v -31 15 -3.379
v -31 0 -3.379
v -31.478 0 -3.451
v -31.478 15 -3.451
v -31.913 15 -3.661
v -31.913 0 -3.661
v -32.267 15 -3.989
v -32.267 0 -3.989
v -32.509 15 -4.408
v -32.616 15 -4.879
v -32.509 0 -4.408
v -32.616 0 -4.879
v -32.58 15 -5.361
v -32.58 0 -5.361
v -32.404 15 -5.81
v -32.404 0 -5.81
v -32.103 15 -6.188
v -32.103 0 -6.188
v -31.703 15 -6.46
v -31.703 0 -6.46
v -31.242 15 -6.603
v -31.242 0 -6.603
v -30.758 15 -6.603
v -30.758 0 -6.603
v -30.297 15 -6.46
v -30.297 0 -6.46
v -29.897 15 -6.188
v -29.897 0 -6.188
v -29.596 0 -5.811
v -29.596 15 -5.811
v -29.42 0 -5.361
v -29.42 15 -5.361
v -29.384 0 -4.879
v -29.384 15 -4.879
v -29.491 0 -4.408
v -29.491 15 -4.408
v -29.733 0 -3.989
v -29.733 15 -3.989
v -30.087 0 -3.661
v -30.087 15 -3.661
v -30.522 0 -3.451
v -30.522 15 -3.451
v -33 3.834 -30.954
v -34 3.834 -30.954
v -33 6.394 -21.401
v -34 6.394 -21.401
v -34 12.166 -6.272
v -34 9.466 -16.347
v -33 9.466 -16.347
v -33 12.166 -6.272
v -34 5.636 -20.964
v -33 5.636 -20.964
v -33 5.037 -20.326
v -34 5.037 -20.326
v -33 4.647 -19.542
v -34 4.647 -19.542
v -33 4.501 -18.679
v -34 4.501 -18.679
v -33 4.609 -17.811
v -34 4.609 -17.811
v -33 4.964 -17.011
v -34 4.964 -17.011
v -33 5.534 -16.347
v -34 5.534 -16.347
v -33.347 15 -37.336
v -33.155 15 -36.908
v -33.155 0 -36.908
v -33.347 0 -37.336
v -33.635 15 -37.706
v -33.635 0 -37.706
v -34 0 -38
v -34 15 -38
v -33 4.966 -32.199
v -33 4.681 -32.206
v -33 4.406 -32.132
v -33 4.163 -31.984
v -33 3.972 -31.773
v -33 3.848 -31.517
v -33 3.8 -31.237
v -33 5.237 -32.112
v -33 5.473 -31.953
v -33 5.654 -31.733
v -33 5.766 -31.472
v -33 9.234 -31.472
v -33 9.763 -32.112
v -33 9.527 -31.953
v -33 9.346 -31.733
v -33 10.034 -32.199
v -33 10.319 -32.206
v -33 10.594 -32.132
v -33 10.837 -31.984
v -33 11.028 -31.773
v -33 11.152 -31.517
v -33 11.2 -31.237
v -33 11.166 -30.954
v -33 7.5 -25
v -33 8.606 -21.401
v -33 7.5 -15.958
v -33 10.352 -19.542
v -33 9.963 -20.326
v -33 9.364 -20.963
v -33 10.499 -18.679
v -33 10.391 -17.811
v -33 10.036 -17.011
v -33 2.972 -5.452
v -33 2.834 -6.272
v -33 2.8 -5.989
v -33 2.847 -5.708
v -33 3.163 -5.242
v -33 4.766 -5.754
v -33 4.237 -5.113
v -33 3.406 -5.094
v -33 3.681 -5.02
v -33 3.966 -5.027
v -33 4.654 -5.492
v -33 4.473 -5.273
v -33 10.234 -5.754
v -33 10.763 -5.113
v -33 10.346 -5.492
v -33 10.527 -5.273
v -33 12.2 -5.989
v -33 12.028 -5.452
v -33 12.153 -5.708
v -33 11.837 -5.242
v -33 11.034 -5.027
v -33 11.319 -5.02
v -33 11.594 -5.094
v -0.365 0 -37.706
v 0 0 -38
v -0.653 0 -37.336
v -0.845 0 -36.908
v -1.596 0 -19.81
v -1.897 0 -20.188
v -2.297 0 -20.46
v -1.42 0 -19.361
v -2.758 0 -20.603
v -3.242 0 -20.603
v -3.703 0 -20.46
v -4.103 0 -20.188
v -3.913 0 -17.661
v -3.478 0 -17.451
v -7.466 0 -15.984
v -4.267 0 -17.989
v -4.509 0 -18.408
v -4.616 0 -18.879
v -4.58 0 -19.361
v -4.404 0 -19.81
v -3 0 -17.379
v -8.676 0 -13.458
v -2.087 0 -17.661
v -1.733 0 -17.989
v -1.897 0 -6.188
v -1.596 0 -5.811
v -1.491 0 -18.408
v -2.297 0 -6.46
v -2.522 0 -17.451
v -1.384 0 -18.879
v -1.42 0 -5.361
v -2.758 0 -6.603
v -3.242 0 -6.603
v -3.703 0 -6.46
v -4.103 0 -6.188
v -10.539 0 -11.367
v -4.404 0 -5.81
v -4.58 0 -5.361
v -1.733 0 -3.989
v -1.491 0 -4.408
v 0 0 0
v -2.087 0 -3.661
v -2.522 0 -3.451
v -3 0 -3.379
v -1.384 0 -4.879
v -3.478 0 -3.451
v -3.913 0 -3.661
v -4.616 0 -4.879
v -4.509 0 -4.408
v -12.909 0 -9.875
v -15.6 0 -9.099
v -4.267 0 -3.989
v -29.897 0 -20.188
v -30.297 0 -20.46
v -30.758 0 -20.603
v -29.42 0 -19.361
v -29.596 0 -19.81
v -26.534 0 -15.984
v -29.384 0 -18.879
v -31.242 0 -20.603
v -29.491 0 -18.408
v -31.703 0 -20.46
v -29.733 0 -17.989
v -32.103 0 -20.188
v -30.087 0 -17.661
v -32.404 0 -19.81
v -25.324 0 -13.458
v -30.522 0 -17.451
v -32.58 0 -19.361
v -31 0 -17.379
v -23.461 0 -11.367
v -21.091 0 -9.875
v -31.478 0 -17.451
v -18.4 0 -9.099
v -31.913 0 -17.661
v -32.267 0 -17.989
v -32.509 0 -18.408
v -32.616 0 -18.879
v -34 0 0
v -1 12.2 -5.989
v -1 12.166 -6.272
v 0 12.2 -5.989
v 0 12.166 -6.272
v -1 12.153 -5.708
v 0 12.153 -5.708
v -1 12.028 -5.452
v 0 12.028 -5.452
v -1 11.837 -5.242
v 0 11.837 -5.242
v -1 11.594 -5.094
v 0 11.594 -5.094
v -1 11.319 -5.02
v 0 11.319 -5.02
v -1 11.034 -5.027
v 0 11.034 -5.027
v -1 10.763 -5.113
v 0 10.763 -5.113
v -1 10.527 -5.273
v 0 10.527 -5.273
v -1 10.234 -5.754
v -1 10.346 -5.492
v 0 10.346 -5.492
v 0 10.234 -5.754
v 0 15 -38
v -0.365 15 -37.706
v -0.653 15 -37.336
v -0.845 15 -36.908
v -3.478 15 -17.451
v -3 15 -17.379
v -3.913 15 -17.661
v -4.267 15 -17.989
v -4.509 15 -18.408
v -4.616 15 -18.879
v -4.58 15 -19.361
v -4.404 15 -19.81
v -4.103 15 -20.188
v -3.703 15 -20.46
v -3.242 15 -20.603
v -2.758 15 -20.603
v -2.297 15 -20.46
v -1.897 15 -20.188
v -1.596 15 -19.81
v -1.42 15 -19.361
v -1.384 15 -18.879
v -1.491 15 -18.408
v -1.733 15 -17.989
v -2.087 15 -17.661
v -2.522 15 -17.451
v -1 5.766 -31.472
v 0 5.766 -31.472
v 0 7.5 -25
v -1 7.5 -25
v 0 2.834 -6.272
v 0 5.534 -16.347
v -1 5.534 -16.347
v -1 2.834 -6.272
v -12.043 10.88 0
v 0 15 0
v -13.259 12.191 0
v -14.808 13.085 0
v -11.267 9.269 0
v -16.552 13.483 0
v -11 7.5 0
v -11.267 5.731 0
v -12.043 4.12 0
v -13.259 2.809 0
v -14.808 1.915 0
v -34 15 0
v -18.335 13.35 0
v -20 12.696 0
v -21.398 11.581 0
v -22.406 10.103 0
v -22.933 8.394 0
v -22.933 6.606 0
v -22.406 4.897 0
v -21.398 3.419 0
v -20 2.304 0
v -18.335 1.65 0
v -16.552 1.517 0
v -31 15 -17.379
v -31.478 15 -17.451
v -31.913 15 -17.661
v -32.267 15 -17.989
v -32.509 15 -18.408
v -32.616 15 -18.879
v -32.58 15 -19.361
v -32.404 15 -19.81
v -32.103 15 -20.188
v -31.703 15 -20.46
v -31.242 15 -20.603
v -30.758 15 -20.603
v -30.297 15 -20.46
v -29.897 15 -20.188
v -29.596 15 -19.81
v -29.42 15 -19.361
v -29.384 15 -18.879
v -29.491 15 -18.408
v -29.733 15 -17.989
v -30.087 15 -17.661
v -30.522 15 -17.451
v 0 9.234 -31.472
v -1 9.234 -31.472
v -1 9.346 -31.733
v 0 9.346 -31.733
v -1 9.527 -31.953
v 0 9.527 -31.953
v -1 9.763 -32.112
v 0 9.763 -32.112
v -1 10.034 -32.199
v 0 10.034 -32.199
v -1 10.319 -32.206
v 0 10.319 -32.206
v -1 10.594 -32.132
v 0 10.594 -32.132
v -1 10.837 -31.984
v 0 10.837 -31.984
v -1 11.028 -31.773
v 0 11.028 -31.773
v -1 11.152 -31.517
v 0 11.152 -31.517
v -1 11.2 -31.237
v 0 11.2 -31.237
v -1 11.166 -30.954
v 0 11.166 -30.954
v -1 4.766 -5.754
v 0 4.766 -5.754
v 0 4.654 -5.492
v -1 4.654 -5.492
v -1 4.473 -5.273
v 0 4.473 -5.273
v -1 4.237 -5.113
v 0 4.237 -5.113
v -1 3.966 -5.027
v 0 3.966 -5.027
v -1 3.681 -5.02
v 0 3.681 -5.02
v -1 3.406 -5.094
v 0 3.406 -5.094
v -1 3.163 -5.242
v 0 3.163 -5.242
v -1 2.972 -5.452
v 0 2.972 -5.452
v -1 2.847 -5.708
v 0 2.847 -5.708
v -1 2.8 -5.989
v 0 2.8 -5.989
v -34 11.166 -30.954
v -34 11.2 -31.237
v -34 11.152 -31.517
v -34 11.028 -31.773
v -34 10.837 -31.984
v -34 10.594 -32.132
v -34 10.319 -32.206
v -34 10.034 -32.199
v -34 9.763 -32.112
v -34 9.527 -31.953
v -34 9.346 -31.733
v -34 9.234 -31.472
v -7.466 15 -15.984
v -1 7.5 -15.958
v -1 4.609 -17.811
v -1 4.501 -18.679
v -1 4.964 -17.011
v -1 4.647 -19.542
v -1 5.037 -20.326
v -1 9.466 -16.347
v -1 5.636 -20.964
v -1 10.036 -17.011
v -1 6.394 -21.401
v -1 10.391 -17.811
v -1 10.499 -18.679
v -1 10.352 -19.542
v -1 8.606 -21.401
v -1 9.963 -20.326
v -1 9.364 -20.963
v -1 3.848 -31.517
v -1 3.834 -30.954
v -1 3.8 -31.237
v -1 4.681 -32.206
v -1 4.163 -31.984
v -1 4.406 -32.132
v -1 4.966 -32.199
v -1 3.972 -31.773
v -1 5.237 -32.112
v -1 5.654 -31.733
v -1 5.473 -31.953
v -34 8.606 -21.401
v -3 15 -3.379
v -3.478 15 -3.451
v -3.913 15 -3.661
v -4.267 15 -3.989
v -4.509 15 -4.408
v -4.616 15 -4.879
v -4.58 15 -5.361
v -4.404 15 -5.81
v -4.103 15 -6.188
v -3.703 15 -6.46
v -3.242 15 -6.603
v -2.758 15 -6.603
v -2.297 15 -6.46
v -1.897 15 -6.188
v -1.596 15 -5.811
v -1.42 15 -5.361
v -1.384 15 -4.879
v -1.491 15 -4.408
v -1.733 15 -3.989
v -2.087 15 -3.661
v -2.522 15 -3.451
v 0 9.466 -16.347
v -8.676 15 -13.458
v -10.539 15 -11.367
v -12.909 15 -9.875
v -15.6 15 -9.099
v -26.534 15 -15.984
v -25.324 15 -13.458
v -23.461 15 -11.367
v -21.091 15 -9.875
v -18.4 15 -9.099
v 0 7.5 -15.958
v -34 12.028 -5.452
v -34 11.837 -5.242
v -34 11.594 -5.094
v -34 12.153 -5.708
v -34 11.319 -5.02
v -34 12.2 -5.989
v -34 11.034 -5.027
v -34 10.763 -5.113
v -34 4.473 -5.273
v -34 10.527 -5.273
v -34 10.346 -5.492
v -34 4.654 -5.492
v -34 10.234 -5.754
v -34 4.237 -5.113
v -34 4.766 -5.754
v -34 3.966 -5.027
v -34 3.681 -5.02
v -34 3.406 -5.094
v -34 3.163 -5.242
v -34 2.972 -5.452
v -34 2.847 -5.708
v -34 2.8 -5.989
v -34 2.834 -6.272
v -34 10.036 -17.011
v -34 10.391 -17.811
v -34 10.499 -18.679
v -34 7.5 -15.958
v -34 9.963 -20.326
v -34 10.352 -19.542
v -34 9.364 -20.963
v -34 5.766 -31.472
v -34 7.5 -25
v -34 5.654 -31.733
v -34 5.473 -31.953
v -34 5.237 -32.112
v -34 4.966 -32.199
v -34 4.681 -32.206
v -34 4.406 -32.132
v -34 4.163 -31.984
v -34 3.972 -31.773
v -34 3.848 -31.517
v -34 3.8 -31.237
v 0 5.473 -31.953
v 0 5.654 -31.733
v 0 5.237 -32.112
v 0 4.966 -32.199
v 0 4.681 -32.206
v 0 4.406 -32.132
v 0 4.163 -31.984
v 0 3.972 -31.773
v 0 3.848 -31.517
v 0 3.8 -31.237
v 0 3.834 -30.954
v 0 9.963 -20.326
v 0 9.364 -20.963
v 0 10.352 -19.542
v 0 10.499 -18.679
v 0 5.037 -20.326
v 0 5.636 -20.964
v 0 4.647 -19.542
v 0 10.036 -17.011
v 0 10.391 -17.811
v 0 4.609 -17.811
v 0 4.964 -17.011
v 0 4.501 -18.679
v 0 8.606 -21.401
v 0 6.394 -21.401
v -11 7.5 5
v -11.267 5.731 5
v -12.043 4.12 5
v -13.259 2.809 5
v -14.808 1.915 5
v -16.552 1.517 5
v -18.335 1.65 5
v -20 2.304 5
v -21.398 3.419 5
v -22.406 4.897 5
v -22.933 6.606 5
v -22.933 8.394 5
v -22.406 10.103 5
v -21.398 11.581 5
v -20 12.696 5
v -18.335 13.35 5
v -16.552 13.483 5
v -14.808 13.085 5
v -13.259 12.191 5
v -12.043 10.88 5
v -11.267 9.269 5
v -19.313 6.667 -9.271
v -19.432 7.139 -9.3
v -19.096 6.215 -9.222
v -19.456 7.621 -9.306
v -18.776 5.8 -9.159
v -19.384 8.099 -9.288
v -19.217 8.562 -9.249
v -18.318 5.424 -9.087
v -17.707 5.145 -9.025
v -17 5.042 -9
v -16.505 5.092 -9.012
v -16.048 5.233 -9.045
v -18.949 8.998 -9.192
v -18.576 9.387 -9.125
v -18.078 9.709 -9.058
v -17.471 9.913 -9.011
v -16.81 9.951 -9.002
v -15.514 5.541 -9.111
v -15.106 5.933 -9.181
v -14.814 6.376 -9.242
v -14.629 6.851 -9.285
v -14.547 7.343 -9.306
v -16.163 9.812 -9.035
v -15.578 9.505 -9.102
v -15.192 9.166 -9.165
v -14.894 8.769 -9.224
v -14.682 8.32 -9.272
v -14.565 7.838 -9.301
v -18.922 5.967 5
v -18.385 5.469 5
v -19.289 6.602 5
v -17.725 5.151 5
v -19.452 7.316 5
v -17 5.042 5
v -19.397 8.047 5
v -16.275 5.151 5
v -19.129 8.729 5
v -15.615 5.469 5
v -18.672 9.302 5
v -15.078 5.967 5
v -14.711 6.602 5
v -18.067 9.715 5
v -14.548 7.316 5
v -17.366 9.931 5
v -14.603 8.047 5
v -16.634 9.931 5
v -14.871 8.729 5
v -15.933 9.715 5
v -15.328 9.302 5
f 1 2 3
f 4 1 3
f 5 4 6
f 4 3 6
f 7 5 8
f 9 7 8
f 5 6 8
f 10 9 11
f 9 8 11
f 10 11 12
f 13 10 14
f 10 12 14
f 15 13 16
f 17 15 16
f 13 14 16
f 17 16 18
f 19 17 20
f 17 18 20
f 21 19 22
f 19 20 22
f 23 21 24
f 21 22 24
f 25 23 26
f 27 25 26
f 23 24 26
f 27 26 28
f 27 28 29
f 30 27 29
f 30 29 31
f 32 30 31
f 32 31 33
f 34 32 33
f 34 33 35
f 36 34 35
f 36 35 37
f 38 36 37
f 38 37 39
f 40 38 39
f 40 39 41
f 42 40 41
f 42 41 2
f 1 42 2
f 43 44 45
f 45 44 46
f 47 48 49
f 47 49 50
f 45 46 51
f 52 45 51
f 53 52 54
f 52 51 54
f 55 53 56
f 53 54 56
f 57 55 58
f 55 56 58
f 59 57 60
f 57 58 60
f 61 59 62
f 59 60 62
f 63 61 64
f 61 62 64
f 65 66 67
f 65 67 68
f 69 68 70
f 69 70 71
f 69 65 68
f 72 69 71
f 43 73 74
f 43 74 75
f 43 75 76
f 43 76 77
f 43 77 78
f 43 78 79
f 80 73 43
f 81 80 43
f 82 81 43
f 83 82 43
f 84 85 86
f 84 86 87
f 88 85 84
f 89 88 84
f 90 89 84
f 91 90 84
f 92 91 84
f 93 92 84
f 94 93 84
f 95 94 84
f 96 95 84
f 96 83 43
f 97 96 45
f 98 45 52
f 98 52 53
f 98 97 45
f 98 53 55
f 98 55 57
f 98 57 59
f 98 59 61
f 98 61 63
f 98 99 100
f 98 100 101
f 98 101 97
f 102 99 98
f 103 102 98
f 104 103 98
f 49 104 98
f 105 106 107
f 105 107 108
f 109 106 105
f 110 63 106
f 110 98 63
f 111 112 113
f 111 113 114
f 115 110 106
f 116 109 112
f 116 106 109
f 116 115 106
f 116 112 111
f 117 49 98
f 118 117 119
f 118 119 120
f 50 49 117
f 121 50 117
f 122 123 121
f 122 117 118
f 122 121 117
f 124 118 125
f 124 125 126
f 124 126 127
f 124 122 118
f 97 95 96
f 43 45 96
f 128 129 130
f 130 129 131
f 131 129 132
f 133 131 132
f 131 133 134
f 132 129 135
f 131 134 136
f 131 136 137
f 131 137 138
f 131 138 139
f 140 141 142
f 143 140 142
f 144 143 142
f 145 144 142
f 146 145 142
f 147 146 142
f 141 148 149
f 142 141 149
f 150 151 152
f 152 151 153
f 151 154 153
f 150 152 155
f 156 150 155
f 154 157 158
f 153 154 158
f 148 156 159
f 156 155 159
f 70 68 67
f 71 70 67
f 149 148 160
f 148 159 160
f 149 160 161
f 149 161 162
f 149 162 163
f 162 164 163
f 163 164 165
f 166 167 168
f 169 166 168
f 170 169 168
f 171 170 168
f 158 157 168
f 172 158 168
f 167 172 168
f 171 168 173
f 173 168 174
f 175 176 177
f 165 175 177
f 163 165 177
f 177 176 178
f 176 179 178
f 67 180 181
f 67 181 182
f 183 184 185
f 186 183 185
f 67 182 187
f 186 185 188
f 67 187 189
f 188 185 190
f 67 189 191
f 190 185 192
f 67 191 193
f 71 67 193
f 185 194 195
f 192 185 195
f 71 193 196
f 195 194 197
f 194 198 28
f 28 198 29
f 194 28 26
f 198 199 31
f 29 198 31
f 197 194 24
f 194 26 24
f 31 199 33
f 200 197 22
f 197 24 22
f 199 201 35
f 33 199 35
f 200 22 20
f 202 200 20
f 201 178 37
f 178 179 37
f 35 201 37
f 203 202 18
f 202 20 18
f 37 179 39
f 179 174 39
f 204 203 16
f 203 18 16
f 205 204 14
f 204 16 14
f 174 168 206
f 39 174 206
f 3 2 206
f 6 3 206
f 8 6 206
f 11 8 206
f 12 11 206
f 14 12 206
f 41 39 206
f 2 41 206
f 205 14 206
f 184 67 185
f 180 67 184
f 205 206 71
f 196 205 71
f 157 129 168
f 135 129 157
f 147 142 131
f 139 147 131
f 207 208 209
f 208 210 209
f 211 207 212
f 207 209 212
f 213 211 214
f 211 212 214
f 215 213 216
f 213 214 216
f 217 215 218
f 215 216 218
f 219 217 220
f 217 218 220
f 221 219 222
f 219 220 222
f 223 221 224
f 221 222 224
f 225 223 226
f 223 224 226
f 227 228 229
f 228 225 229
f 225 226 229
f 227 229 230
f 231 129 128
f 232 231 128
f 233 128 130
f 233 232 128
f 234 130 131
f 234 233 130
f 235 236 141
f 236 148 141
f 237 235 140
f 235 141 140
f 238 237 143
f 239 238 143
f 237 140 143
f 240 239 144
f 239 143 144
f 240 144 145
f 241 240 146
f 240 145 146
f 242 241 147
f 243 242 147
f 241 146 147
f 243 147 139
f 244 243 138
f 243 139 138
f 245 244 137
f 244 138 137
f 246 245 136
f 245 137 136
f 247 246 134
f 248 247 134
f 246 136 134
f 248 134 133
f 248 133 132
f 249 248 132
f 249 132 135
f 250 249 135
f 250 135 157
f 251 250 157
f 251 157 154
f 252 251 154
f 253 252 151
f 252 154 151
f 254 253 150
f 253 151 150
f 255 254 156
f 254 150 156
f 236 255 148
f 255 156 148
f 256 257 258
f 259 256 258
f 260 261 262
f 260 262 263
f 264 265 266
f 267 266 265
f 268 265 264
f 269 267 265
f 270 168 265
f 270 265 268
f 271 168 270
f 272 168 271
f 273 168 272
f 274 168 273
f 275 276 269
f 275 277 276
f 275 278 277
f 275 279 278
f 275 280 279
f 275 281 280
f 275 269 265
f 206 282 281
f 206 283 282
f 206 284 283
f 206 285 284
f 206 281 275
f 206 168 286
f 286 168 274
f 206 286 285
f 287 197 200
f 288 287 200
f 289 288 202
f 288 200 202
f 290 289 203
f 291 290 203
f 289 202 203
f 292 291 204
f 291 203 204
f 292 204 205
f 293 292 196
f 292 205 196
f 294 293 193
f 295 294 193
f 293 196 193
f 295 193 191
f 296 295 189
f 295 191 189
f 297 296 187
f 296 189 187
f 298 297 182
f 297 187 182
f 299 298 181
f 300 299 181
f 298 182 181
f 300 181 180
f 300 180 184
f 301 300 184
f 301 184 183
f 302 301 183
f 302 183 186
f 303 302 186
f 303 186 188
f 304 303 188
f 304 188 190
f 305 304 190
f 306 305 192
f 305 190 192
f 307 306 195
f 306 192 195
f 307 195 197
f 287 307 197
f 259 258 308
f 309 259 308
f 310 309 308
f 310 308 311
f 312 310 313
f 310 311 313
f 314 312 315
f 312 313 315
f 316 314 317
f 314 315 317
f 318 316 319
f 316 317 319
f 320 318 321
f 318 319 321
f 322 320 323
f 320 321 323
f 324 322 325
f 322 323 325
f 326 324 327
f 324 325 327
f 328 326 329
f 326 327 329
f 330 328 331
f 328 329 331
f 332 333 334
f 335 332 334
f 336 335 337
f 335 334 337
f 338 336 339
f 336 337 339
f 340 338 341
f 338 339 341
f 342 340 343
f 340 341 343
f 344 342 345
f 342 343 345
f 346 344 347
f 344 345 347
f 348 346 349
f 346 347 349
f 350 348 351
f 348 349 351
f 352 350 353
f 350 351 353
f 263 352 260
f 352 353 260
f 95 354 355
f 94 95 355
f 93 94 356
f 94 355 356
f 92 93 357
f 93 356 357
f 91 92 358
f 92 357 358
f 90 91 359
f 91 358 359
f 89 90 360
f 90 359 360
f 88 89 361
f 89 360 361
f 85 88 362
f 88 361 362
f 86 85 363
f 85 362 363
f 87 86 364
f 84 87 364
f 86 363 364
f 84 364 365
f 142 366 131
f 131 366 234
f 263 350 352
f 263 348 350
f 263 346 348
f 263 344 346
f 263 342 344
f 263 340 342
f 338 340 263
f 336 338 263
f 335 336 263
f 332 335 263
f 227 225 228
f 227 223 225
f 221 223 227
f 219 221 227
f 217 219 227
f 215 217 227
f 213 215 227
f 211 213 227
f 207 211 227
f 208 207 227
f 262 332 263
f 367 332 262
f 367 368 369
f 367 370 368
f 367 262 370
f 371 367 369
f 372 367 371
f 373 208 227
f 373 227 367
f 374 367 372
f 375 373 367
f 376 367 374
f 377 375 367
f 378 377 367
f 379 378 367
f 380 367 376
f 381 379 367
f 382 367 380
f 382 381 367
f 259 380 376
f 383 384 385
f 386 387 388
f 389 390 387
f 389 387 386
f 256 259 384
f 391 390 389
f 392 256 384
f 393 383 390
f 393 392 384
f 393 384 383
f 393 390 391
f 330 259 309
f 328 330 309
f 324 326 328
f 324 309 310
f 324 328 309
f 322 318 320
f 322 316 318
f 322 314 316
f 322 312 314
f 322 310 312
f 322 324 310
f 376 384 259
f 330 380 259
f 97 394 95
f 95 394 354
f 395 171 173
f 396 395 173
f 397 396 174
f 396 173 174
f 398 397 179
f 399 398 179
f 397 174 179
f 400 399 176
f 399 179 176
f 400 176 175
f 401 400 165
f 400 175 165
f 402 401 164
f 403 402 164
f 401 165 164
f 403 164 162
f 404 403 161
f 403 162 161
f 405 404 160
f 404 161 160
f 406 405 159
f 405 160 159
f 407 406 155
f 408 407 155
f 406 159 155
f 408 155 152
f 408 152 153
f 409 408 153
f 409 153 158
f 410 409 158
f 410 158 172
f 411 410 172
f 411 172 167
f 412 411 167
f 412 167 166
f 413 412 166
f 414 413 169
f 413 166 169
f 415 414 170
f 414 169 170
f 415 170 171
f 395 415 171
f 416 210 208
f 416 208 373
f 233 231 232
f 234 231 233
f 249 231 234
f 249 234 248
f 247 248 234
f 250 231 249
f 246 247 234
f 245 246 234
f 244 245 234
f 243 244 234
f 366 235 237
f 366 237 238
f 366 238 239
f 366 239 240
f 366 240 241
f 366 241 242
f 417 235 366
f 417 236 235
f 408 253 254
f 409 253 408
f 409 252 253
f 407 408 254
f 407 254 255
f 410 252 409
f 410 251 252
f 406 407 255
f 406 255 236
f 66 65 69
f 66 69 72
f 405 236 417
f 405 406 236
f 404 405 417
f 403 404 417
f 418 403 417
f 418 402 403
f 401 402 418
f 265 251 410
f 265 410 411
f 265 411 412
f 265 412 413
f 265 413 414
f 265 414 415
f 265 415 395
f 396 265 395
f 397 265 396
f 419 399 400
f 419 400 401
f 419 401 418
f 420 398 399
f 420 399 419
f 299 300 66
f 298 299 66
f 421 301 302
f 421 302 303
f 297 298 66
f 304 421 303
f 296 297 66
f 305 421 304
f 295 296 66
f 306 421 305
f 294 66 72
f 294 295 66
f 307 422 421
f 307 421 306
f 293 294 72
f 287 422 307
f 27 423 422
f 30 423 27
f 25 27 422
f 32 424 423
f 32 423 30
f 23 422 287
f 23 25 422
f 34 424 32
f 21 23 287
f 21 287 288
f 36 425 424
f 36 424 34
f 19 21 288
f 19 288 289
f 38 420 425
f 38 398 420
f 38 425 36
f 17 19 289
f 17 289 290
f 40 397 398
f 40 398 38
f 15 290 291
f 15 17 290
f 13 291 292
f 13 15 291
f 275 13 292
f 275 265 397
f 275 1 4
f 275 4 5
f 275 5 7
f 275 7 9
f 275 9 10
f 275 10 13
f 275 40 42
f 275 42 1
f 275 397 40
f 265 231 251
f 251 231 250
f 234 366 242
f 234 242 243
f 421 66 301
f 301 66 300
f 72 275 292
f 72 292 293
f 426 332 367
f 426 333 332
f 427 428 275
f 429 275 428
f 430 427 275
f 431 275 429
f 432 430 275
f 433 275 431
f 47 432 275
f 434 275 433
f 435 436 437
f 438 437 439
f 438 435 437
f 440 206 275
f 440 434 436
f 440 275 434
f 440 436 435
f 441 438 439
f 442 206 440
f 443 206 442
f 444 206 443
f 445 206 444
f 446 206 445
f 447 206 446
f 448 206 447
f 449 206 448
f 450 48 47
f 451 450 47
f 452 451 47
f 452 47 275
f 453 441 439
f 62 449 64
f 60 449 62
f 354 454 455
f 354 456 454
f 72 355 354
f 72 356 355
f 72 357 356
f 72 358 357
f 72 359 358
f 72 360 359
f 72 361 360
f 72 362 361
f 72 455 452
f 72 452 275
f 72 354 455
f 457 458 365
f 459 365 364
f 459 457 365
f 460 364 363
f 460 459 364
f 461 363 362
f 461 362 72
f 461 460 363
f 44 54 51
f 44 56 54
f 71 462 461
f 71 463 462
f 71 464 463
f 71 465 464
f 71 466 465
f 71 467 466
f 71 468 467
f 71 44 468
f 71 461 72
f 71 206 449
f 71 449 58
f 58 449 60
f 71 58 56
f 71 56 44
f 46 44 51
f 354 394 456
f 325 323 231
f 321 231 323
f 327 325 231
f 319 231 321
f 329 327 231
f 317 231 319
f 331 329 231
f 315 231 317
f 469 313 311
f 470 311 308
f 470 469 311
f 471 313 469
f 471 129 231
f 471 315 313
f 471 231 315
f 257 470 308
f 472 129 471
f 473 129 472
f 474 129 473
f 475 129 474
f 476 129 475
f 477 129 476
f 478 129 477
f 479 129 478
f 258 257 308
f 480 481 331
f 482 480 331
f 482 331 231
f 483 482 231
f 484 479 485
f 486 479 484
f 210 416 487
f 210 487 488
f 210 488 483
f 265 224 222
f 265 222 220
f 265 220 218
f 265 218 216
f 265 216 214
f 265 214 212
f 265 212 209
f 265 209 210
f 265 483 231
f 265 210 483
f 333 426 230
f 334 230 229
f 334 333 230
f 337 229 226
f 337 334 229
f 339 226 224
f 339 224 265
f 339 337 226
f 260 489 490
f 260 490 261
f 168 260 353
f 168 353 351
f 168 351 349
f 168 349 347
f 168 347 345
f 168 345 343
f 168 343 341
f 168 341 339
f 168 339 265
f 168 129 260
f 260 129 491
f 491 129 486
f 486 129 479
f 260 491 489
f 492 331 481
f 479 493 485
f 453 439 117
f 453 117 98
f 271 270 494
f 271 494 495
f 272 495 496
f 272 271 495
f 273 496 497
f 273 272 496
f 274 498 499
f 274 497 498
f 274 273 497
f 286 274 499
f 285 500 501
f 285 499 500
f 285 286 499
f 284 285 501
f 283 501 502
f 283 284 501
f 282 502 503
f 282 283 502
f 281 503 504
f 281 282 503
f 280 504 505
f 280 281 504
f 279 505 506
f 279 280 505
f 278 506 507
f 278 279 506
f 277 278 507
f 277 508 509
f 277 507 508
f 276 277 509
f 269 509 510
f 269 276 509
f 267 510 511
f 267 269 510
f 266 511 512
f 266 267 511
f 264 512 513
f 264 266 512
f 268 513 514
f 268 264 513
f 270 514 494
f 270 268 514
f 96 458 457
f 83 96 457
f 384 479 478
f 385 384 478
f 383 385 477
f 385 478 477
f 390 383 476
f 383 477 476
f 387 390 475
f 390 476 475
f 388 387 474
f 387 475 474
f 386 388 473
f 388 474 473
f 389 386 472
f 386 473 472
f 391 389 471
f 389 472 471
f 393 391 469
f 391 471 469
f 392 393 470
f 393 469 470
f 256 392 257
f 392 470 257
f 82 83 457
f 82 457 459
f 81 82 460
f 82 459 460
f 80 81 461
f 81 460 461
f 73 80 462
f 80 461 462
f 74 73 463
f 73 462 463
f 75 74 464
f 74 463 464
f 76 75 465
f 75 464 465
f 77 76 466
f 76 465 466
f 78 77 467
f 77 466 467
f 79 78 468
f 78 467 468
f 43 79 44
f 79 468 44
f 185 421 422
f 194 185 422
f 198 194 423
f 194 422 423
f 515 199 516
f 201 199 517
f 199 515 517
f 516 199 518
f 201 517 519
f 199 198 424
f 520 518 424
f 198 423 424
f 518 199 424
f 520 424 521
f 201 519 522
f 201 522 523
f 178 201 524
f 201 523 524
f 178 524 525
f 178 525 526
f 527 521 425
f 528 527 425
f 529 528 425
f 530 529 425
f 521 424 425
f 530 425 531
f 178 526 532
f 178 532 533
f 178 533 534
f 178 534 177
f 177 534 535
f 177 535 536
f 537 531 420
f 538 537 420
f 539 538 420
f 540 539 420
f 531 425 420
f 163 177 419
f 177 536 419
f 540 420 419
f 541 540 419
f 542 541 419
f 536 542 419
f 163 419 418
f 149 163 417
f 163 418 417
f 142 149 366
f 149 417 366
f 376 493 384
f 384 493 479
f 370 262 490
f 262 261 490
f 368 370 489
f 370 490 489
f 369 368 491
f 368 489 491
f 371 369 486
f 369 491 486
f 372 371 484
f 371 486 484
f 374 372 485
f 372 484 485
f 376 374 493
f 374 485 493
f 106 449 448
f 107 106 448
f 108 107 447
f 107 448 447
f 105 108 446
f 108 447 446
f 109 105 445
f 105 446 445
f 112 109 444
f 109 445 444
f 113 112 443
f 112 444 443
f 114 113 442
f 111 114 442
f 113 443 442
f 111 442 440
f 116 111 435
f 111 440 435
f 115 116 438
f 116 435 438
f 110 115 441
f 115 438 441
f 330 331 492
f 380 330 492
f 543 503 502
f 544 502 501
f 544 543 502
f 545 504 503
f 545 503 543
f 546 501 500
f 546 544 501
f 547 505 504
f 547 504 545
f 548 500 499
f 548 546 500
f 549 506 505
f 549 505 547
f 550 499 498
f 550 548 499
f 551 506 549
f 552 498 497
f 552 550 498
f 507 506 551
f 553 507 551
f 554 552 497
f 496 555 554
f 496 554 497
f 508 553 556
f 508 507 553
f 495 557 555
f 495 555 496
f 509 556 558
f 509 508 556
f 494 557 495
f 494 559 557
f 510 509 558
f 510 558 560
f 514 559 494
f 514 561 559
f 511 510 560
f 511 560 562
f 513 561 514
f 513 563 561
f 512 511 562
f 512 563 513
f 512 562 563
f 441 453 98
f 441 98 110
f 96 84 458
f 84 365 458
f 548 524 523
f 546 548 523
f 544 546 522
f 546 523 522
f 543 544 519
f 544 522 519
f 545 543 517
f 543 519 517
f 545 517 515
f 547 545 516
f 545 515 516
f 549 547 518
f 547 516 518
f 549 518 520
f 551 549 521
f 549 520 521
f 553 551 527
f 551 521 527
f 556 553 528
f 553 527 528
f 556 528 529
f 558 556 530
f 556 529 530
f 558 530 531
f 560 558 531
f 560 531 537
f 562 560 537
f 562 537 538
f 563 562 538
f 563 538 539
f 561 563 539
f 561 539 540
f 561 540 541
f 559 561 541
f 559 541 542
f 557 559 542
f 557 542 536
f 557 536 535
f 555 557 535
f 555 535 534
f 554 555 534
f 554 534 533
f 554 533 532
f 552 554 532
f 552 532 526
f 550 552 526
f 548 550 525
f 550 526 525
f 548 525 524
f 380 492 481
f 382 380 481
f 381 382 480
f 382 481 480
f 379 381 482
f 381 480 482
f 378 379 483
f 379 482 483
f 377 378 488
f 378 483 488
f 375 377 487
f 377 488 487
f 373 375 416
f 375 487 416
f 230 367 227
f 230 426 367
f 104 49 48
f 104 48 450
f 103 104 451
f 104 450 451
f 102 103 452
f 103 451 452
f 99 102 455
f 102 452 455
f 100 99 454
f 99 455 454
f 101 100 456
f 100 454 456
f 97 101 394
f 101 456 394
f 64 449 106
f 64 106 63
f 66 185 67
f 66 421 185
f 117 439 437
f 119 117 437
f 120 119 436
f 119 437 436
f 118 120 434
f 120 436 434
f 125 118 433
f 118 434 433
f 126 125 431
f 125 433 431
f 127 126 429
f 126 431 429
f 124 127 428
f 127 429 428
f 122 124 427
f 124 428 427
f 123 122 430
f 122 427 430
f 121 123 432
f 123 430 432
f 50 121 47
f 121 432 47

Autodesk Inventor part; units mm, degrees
ref_plane "XZ Plane" through (0, 0, 0) normal (0, 1, 0) x (-1, 0, 0)
ref_plane "XY Plane" through (0, 0, 0) normal (0, 0, 1) x (1, 0, 0)
sketch "Sketch1" plane through (0, 0, 0) normal (0, 1, 0) x (-1, 0, 0)
  line L0 (0, 0) -> (34, 0)
  line L1 (34, 0) -> (34, -38)
  line L2 (34, -38) -> (0, -38)
  line L3 (0, -38) -> (0, 0)
  point P0 (17, -38)
  dimension "d0" = 34
  dimension "d1" = 38
extrude "Extrusion1" add sketch "Sketch1" along normal blind 15
sketch "Sketch2" plane through (0, 15, 0) normal (0, 1, 0) x (1, 0, 0)
  arc A0 (-26.5342, 15.9835) -> (-7.4658, 15.9835) centre (-17, 19) ccw
  line L0 (-26.5342, 15.9835) -> (-33.5, 38)
  line L1 (0, 38) -> (-34, 38) projected
  line L2 (-7.4658, 15.9835) -> (-0.5, 38)
  point P0 (0, 0)
  point P1 (-17, 38)
  dimension "d4" = 16.5
  dimension "d5" = 16.5
  dimension "d6" = 10
  dimension "d7" = 19
extrude "Extrusion2" cut sketch "Sketch2" against normal up to surface (15 mm away)
fillet "Fillet1" radius 2 2 edges at (-0.5, 7.5, -38) (-33.5, 7.5, -38)
sketch "Sketch3" plane through (0, 15, 0) normal (0, 1, 0) x (1, 0, 0)
  line L0 (-34, 0) -> (0, 0) projected
  point P0 (-3, 19)
  point P1 (-31, 19)
  point P2 (-17, 0)
  point P3 (-17, 0)
  point P4 (-34, 38)
  dimension "d19" = 14
  dimension "d20" = 14
  dimension "d59" = 19
hole "Hole1" at (-3, 15, -19) at (-31, 15, -19) direction (0, -1, 0) diameter 3.242 depth 15 thread size "M4x0.7" class "6H" standard "ISO Metric profile"
sketch "Sketch4" plane through (0, 15, 0) normal (0, 1, 0) x (1, 0, 0)
  line L0 (-34, 0) -> (0, 0) projected
  point P0 (-31, 5)
  point P1 (-3, 5)
  point P2 (-17, 0)
  point P3 (-17, 0)
  dimension "d28" = 14
  dimension "d29" = 14
  dimension "d30" = 5
hole "Hole2" at (-31, 15, -5) at (-3, 15, -5) direction (0, -1, 0) diameter 3.242 depth 15 thread size "M4x0.7" class "6H" standard "ISO Metric profile"
sketch "Sketch5" plane through (-34, 0, 0) normal (0, 0, 1) x (1, 0, 0)
  circle A0 centre (17, 7.5) radius 6
  line L0 (0, 0) -> (34, 0) projected
  line L1 (0, 0) -> (0, 15) projected
  point P0 (17, 0)
  point P1 (0, 7.5)
  dimension "d31" = 12
extrude "Extrusion3" add sketch "Sketch5" along normal blind 5
sketch "Sketch6" plane through (-17, 7.5, 5) normal (0, 0, 1) x (1, 0, 0)
  circle A0 centre (0, 0) radius 6 projected
  point P0 (17, -7.5)
hole "Hole3" at (-17, 7.5, 5) direction (0, 0, -1) diameter 4.917 depth 15 thread size "M6x1" class "6H" standard "ISO Metric profile"
sketch "Sketch7" plane through (-34, 0, -38) normal (-1, 0, 0) x (0, 0, 1)
  line L0 (16.5986, 8.6063) -> (7.046, 11.1659)
  arc A0 (7.046, 11.1659) -> (6.5283, 9.2341) centre (6.7872, 10.2) ccw
  line L1 (6.5283, 9.2341) -> (13, 7.5)
  line L2 (13, 7.5) -> (6.5283, 5.7659)
  arc A1 (6.5283, 5.7659) -> (7.046, 3.8341) centre (6.7872, 4.8) ccw
  line L3 (7.046, 3.8341) -> (16.5986, 6.3937)
  line L4 (21.653, 9.4662) -> (31.7283, 12.1659)
  arc A2 (32.246, 10.2341) -> (31.7283, 12.1659) centre (31.9872, 11.2) ccw
  line L5 (32.246, 10.2341) -> (22.0423, 7.5)
  line L6 (22.0423, 7.5) -> (32.246, 4.7659)
  arc A3 (31.7283, 2.8341) -> (32.246, 4.7659) centre (31.9872, 3.8) ccw
  line L7 (31.7283, 2.8341) -> (21.653, 5.5338)
  line L8 (0, 0) -> (0, 15) projected
  line L9 (0, 7.5) -> (36.5337, 7.5) construction
  arc A4 (16.5986, 6.3937) -> (21.653, 5.5338) centre (19.3872, 7.5) ccw
  arc A5 (21.653, 9.4662) -> (16.5986, 8.6063) centre (19.3872, 7.5) ccw
  line L10 (0, 15) -> (38, 15) projected
  point P0 (38, 0)
  point P1 (11.8223, 5.1139)
  dimension "d42" = 2
  dimension "d43" = 2
  dimension "d44" = 2
  dimension "d45" = 2
  dimension "d46" = 12.6
  dimension "d47" = 12.6
  dimension "d48" = 26
  dimension "d49" = 26
  dimension "d50" = 30
  dimension "d51" = 30
  dimension "d52" = 3.8
  dimension "d53" = 3
  dimension "d54" = 3
  dimension "d55" = 13
extrude "Extrusion4" cut sketch "Sketch7" against normal blind 1
ref_plane "Work Plane1" through (-17, 0, 0) normal (1, 0, 0) x (0, 1, 0)
mirror "Mirror1" about plane through (-17, 0, 0) normal (1, 0, 0) of "Extrusion4"
equation "\"d5\" = d4"
equation "\"d20\" = d19"
equation "\"d12\" = d20"
equation "\"d29\" = d28"
equation "\"d42\" = d43"
equation "\"d44\" = d43"
equation "\"d47\" = d46"
equation "\"d54\" = d53"
properties part number "2023"
